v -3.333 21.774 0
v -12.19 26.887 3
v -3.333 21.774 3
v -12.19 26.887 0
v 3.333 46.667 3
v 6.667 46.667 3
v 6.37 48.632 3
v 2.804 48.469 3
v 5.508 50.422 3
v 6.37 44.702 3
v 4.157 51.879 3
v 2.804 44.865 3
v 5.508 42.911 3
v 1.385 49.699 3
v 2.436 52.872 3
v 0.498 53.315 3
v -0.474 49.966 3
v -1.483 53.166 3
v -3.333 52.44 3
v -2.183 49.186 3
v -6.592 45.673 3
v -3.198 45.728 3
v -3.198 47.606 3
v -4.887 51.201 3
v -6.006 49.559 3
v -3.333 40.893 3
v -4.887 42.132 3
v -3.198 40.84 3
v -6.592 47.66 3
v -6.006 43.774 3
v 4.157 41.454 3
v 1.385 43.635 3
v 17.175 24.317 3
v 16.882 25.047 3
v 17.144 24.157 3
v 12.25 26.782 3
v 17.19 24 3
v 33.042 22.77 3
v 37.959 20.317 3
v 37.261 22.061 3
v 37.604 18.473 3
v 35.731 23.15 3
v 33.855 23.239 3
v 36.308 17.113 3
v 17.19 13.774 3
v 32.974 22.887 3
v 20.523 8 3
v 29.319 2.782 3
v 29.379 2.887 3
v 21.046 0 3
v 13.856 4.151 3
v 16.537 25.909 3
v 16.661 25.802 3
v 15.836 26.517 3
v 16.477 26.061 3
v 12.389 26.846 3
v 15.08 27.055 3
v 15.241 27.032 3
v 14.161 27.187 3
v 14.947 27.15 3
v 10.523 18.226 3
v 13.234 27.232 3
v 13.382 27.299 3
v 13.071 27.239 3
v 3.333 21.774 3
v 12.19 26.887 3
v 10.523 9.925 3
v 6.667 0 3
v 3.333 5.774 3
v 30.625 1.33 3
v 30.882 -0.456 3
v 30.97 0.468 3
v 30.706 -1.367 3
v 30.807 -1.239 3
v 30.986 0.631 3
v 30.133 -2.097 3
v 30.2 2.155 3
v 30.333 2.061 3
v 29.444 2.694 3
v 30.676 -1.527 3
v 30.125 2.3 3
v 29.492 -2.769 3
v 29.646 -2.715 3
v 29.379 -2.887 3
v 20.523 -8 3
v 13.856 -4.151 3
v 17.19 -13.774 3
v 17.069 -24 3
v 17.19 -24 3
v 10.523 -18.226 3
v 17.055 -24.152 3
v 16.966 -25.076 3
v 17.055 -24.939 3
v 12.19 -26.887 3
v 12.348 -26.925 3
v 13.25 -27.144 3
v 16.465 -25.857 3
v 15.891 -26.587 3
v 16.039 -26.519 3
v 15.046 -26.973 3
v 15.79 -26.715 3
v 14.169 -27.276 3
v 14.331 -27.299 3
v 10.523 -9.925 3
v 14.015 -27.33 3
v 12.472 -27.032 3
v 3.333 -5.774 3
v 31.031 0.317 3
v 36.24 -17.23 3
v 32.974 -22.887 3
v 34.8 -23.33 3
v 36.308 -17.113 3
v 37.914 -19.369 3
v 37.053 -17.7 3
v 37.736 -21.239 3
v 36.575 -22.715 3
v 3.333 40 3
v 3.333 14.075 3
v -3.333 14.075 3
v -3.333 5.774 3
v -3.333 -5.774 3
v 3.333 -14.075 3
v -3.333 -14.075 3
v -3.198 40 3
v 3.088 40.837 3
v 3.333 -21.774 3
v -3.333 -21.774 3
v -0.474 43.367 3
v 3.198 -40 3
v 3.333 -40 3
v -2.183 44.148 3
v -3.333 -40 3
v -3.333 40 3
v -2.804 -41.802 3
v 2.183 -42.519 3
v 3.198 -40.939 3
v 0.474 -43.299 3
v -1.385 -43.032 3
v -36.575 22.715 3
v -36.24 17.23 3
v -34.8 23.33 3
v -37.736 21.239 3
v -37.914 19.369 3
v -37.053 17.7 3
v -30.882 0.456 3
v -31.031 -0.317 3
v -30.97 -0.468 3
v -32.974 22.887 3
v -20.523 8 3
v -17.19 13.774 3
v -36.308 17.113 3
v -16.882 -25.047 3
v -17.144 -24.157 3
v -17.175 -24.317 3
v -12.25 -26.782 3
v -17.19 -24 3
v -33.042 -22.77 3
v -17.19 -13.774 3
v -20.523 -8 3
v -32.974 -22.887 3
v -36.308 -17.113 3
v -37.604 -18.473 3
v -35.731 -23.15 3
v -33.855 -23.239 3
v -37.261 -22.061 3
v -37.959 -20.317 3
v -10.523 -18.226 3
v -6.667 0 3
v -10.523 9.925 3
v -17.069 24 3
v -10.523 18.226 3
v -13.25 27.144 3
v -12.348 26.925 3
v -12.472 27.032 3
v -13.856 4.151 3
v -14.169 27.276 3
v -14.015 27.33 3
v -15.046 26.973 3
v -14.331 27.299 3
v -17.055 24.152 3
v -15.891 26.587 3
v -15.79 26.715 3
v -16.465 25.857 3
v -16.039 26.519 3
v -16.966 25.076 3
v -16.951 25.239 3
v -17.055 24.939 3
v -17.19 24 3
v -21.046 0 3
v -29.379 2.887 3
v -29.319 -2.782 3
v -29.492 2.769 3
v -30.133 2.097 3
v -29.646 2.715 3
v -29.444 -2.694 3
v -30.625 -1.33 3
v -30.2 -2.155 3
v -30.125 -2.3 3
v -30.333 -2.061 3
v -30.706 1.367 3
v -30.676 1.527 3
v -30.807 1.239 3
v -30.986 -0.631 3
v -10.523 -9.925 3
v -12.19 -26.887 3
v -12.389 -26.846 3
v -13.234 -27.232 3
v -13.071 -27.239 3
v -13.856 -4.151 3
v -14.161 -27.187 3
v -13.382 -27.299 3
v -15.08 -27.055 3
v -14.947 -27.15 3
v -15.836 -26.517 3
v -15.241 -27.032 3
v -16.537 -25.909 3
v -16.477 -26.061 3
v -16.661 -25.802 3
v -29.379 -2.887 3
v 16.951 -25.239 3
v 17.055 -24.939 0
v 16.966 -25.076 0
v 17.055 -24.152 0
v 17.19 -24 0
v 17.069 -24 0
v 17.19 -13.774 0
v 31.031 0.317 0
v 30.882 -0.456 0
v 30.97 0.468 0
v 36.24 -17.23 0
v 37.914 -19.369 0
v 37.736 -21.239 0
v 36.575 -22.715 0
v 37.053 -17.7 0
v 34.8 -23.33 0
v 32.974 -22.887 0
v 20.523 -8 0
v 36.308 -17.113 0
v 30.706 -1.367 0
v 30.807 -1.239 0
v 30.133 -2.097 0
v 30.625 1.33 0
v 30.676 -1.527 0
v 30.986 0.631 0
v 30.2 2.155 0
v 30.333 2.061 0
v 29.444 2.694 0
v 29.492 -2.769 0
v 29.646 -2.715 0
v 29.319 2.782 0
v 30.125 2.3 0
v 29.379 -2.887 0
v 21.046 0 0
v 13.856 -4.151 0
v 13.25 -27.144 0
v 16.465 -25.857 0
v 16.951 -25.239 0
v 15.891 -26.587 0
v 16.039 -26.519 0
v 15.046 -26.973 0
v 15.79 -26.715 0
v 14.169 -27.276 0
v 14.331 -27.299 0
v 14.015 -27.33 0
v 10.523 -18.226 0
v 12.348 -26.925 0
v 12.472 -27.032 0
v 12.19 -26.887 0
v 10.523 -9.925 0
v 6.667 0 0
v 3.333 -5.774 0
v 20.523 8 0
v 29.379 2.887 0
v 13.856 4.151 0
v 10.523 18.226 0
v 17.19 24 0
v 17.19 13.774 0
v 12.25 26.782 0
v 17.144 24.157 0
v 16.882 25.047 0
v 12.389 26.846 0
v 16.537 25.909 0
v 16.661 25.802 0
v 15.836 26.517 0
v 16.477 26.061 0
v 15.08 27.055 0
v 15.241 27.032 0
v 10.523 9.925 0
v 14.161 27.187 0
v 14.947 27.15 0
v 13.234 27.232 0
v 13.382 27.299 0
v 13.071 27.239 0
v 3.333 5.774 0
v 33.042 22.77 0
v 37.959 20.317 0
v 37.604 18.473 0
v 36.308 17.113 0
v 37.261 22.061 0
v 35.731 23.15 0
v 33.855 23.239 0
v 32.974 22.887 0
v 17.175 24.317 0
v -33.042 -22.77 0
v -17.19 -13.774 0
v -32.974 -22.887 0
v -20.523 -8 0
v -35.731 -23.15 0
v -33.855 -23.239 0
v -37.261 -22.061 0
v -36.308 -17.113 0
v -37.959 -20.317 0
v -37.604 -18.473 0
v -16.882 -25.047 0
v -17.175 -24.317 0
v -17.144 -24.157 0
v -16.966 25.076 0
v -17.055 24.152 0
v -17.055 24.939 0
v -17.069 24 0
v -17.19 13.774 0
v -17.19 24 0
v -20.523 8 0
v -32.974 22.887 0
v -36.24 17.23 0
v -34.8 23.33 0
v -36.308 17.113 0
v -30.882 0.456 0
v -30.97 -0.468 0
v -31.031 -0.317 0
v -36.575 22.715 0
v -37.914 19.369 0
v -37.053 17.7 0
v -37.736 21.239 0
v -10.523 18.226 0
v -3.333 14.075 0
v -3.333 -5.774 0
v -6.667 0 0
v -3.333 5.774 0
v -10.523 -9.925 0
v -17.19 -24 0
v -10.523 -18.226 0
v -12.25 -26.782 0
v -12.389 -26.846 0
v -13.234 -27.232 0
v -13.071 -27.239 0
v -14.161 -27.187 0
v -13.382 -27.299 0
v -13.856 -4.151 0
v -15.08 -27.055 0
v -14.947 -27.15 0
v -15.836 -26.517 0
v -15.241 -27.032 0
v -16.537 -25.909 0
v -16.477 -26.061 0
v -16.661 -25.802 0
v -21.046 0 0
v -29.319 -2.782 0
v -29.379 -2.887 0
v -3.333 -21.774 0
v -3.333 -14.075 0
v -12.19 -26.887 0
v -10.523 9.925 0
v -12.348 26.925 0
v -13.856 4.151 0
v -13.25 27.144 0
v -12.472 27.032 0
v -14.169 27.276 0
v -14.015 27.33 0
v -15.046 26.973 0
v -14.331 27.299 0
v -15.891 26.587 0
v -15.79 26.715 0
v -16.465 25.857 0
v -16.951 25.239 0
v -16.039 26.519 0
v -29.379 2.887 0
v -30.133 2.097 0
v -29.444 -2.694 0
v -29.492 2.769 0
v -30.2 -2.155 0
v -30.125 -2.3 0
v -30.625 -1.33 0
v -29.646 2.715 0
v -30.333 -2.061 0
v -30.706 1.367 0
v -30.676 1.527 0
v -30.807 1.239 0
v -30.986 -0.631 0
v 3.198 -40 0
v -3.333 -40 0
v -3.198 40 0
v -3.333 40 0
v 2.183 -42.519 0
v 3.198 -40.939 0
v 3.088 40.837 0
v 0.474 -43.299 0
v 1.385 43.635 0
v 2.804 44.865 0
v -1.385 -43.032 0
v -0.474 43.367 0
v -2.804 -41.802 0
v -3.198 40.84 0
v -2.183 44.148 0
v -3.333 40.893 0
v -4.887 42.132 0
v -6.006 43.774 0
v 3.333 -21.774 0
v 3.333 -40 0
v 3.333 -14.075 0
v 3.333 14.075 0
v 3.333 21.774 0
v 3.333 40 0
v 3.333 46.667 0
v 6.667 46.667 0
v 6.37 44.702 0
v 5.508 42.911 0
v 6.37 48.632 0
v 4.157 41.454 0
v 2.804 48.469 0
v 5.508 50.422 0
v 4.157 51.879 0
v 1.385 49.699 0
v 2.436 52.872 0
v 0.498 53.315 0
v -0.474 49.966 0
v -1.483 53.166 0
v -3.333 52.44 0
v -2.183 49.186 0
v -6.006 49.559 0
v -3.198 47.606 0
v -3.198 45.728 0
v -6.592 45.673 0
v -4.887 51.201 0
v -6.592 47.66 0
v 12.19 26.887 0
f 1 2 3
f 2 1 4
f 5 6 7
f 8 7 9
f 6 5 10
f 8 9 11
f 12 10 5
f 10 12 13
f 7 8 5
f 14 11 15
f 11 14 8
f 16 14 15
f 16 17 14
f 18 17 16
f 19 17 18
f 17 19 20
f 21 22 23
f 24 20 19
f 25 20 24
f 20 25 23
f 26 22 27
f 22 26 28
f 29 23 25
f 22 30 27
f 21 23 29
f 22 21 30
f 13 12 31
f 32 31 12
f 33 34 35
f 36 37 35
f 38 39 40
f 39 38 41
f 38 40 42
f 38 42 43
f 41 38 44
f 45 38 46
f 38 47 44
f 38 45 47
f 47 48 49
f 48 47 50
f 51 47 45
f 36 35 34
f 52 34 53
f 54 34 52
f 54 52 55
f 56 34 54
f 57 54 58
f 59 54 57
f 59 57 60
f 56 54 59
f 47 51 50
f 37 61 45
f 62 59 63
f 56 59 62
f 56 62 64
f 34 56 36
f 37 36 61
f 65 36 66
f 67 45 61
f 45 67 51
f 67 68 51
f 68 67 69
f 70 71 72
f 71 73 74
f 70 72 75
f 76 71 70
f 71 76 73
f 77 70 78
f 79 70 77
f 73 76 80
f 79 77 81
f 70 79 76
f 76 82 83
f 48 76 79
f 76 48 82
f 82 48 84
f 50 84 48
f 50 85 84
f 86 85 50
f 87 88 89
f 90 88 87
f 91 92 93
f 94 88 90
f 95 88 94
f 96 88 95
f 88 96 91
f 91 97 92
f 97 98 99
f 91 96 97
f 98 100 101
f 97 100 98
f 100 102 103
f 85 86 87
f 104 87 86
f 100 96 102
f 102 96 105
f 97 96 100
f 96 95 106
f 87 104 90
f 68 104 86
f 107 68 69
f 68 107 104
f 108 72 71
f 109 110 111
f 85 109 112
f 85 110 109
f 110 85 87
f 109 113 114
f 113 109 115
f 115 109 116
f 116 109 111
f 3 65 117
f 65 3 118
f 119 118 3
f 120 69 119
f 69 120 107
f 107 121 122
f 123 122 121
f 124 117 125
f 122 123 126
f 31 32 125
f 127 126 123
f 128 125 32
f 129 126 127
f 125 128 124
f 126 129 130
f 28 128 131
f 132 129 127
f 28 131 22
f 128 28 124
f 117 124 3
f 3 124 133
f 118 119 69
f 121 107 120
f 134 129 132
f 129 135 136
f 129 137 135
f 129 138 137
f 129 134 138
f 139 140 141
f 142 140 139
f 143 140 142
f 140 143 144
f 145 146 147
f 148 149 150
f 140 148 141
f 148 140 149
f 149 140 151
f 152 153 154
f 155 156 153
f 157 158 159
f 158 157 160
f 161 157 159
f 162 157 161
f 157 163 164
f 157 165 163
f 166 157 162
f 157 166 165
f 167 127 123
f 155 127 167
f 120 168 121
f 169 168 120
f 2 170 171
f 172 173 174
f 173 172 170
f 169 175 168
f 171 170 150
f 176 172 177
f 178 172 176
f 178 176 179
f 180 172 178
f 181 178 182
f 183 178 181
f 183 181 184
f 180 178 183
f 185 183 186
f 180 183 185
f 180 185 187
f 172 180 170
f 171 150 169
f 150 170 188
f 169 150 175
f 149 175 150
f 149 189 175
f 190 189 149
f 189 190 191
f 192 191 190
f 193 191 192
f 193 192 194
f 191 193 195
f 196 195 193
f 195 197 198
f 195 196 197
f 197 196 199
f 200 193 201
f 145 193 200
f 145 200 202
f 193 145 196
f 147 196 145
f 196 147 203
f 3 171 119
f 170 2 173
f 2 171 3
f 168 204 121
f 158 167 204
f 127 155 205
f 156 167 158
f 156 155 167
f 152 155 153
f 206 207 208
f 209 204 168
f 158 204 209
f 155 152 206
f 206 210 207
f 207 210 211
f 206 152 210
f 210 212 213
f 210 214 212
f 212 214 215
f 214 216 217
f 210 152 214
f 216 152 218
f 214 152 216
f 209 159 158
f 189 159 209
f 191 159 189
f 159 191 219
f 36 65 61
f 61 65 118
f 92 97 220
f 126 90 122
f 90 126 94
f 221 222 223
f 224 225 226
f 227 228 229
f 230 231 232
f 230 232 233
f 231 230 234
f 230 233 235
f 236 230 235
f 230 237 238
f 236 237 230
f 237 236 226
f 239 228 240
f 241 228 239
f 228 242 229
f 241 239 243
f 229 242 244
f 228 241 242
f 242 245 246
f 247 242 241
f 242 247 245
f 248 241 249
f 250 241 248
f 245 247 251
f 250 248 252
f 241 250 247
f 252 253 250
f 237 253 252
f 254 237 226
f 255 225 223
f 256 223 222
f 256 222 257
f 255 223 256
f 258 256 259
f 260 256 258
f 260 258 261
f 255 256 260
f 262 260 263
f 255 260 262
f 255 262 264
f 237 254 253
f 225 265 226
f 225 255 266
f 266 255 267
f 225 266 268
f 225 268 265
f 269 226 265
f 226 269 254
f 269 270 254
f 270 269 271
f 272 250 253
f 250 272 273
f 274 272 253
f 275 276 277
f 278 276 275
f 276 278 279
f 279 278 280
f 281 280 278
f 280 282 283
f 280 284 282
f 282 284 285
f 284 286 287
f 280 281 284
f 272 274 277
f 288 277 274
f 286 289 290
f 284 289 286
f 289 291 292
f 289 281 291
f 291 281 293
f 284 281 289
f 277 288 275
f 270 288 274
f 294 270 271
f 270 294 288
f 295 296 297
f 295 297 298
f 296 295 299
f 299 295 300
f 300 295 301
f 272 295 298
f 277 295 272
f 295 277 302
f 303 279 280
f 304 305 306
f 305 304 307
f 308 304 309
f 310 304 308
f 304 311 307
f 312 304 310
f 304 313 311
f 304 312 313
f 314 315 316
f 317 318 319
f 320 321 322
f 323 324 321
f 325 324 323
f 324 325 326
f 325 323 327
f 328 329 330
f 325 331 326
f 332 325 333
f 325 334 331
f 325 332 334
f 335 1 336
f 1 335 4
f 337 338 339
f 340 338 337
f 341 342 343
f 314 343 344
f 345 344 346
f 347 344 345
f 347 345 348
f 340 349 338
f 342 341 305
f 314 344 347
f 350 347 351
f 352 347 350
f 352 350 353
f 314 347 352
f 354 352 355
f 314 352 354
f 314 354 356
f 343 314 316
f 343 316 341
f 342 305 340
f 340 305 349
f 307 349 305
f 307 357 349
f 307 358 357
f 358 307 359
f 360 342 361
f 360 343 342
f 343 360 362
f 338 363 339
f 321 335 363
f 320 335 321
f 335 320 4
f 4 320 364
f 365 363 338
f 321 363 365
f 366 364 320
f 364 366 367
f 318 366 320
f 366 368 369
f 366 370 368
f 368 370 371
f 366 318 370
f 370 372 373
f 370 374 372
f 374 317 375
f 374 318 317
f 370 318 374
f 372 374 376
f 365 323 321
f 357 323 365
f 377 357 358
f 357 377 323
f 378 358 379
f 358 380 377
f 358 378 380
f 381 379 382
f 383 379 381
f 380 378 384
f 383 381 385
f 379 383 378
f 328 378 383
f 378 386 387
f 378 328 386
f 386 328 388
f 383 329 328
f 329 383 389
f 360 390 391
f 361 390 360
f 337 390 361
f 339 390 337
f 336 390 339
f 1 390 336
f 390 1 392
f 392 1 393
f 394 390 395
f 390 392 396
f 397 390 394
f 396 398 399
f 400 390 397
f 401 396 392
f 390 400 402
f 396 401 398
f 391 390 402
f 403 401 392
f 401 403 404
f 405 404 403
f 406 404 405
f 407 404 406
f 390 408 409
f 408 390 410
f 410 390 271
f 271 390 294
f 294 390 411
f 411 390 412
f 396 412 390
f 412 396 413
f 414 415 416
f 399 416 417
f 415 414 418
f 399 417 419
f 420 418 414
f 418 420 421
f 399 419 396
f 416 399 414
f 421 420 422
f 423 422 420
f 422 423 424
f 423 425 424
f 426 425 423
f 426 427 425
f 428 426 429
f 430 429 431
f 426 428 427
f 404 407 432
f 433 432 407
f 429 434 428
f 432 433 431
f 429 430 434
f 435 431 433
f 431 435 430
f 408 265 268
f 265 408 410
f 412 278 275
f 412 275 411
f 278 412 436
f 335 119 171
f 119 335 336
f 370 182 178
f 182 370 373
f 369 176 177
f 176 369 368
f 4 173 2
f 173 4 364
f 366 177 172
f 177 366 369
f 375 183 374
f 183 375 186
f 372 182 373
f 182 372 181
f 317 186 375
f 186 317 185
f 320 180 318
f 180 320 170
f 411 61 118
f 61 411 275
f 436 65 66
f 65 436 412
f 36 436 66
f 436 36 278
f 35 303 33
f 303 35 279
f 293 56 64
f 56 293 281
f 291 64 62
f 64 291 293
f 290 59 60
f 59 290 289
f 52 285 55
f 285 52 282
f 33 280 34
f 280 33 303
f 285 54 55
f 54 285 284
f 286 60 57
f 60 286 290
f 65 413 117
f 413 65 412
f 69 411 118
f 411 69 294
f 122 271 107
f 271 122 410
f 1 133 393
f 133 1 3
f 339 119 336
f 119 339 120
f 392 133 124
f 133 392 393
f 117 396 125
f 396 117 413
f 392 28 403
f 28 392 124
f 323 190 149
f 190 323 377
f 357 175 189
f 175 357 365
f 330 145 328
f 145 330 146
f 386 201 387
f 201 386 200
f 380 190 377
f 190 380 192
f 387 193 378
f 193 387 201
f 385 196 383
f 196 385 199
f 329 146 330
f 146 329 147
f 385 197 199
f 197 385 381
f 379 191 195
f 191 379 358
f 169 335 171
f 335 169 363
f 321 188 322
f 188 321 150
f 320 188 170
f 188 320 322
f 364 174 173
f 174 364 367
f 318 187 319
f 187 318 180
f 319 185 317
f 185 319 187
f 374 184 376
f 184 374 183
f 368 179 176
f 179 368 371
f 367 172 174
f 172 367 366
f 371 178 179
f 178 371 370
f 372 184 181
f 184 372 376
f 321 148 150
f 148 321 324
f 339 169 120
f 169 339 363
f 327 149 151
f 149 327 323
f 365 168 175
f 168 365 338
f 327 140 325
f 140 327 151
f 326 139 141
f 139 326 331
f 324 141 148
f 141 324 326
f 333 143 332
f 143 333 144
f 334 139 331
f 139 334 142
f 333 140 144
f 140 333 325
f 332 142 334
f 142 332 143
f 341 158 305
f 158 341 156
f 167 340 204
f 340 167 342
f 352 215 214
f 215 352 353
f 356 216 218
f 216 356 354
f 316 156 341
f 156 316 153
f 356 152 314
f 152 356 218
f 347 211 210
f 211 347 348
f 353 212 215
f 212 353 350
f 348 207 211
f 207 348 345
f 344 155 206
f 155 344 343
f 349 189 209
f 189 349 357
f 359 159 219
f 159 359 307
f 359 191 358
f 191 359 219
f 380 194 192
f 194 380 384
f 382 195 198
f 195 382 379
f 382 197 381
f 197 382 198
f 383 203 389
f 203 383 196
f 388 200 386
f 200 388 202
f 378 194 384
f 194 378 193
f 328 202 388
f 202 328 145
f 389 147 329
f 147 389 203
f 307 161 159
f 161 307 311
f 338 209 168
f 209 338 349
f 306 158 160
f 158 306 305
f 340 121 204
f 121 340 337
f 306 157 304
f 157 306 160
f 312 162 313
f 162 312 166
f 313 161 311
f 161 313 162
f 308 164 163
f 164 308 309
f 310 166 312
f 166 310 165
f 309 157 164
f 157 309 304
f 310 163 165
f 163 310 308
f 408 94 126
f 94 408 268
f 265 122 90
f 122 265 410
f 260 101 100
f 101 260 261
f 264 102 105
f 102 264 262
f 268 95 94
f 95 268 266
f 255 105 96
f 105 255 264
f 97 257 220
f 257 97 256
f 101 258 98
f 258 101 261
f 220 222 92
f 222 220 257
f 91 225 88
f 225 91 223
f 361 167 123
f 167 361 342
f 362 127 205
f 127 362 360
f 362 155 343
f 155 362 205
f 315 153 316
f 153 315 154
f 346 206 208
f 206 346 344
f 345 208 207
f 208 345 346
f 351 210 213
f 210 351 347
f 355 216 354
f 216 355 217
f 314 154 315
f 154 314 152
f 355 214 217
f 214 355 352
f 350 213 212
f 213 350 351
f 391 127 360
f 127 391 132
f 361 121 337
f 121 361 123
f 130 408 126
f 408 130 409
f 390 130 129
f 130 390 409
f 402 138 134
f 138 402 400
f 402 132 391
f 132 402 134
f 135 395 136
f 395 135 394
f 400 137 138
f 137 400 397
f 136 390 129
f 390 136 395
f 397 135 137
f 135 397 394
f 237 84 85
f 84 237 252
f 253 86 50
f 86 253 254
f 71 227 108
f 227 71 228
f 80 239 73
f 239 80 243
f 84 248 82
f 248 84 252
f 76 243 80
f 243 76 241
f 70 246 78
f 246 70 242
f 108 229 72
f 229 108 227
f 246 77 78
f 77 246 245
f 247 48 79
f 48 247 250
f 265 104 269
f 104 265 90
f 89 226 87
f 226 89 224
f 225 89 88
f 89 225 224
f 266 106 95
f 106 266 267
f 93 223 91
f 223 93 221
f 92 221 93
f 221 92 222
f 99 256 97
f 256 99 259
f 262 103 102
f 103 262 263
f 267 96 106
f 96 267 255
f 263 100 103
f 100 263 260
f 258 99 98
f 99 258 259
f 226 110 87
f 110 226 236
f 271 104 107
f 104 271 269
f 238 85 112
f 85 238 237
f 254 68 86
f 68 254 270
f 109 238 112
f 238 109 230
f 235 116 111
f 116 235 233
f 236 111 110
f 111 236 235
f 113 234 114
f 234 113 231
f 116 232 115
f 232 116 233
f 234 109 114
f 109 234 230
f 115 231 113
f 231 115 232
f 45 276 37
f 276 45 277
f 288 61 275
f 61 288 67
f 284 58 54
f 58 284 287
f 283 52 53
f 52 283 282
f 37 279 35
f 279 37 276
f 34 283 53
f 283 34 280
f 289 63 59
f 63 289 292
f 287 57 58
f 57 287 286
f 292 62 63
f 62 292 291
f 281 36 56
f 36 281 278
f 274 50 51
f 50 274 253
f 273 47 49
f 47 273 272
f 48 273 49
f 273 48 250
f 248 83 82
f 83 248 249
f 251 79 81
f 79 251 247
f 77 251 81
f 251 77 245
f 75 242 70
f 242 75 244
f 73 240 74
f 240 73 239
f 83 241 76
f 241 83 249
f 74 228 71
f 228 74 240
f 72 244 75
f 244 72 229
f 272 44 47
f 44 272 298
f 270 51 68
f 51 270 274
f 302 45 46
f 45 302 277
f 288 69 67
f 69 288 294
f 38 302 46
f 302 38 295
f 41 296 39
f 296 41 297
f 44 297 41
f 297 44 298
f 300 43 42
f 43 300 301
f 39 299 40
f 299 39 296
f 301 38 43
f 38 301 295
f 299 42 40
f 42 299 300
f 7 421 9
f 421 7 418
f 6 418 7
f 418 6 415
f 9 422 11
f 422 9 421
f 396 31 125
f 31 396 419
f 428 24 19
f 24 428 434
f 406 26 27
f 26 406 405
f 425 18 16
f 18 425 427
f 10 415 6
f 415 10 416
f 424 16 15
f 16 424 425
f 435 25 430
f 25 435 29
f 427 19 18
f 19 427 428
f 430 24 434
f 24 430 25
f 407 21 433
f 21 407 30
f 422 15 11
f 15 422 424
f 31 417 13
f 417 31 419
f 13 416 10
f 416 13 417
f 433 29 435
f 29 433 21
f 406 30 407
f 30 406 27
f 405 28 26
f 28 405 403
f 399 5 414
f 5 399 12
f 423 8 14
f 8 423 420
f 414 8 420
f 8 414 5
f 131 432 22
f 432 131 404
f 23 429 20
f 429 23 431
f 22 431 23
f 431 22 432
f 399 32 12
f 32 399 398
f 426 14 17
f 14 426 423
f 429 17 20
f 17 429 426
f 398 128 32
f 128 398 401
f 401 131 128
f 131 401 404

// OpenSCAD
// snowflake 1
// @author Ilya Protasov

height = 3;
radius = 40;
thicknessA = radius/6;
//Indigo DeepSkyBlue YellowGreen DeepPink OrangeRed LawnGreen DarkSlateBlue Magenta

//function boundDist(blockCount) = cell * blockCount - gap;

module box(xCount, yCount, zCount) {
    translate([halfGap, halfGap, halfGap]) cube([boundDist(xCount), boundDist(yCount), boundDist(zCount)], false);
}

module branch1() {
    translate([-thicknessA/2, 0, 0]) cube([thicknessA, radius, height], false);
    translate([0, radius, 0])  cylinder(height, thicknessA/2, thicknessA/2, false);
    translate([0, radius*0.4, 0]) rotate([0, 0, 60]) branch2();
    translate([0, radius*0.4, 0]) rotate([0, 0, -60]) branch2();
}

module branch2() {
    translate([-thicknessA/2, 0, 0]) cube([thicknessA, radius*0.4, height], false);
    translate([0, radius*0.4, 0]) cylinder(height, thicknessA/2, thicknessA/2, false);
}

module ring() {
    translate([0, radius + thicknessA, 0])
        difference() {
            cylinder(height, thicknessA, thicknessA, false);
            cylinder(height * 2, thicknessA/2, thicknessA/2, true);
        }
}

module snowflake1(branchCount) {
    angle = 360 / branchCount;
    for (i=[0:branchCount-1]) {
        rotate([0, 0, i * angle]) branch1();
    }
    ring();
}

color("DeepSkyBlue") snowflake1(6);
